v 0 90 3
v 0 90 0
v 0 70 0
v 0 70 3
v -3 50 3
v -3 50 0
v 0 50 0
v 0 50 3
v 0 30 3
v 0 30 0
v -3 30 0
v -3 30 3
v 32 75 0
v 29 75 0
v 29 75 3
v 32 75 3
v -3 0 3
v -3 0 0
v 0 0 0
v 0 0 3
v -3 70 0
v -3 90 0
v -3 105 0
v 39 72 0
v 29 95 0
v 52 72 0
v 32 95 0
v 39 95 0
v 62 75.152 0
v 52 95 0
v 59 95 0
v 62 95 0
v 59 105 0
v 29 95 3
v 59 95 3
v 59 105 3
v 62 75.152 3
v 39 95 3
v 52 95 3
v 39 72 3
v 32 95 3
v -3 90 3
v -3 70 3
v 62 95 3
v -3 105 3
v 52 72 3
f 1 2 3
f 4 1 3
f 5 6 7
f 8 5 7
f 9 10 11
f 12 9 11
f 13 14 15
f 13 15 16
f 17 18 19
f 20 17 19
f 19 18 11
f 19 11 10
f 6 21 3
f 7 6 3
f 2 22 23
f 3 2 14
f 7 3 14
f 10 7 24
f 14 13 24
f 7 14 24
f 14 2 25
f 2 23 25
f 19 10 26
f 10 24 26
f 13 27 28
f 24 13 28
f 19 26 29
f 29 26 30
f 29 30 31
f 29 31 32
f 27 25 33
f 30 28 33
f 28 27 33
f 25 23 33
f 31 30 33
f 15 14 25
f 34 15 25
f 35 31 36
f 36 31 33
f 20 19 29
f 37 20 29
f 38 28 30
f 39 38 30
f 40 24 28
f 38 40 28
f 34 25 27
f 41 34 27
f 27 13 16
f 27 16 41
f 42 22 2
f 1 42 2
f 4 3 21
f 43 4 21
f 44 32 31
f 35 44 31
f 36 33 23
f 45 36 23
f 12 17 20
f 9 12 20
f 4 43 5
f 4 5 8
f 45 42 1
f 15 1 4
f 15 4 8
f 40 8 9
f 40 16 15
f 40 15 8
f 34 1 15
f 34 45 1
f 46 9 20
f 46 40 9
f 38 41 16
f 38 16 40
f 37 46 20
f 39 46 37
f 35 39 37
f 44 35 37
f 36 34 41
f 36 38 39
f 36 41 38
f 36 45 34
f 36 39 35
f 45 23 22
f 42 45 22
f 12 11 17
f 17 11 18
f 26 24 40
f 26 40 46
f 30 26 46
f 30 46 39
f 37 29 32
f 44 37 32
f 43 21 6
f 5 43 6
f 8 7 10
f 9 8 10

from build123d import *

# Parameters (mm, degrees)
SKETCH1_W           = 13
SKETCH1_H           = 23
SKETCH1_W_2         = 3
SKETCH1_H_2         = 20
BOSS_EXTRUDE1_DEPTH = 3


with BuildPart() as part:
    # Sketch1 → Boss-Extrude1 (new body)
    with BuildSketch(Plane.XY):
        Polygon((-3, 70), (-3, 50), (0, 50), (0, 30), (-3, 30), (-3, 0), (0, 0), (62, 75.151515152), (62, 95), (59, 95), (59, 105), (15, 105), (-3, 105), (-3, 90), (0, 90), (0, 70), align=None)
        with Locations((45.5, 83.5)):
            Rectangle(SKETCH1_W, SKETCH1_H, mode=Mode.SUBTRACT)
        with Locations((30.5, 85)):
            Rectangle(SKETCH1_W_2, SKETCH1_H_2, mode=Mode.SUBTRACT)
    extrude(amount=BOSS_EXTRUDE1_DEPTH)


solid = part.part
